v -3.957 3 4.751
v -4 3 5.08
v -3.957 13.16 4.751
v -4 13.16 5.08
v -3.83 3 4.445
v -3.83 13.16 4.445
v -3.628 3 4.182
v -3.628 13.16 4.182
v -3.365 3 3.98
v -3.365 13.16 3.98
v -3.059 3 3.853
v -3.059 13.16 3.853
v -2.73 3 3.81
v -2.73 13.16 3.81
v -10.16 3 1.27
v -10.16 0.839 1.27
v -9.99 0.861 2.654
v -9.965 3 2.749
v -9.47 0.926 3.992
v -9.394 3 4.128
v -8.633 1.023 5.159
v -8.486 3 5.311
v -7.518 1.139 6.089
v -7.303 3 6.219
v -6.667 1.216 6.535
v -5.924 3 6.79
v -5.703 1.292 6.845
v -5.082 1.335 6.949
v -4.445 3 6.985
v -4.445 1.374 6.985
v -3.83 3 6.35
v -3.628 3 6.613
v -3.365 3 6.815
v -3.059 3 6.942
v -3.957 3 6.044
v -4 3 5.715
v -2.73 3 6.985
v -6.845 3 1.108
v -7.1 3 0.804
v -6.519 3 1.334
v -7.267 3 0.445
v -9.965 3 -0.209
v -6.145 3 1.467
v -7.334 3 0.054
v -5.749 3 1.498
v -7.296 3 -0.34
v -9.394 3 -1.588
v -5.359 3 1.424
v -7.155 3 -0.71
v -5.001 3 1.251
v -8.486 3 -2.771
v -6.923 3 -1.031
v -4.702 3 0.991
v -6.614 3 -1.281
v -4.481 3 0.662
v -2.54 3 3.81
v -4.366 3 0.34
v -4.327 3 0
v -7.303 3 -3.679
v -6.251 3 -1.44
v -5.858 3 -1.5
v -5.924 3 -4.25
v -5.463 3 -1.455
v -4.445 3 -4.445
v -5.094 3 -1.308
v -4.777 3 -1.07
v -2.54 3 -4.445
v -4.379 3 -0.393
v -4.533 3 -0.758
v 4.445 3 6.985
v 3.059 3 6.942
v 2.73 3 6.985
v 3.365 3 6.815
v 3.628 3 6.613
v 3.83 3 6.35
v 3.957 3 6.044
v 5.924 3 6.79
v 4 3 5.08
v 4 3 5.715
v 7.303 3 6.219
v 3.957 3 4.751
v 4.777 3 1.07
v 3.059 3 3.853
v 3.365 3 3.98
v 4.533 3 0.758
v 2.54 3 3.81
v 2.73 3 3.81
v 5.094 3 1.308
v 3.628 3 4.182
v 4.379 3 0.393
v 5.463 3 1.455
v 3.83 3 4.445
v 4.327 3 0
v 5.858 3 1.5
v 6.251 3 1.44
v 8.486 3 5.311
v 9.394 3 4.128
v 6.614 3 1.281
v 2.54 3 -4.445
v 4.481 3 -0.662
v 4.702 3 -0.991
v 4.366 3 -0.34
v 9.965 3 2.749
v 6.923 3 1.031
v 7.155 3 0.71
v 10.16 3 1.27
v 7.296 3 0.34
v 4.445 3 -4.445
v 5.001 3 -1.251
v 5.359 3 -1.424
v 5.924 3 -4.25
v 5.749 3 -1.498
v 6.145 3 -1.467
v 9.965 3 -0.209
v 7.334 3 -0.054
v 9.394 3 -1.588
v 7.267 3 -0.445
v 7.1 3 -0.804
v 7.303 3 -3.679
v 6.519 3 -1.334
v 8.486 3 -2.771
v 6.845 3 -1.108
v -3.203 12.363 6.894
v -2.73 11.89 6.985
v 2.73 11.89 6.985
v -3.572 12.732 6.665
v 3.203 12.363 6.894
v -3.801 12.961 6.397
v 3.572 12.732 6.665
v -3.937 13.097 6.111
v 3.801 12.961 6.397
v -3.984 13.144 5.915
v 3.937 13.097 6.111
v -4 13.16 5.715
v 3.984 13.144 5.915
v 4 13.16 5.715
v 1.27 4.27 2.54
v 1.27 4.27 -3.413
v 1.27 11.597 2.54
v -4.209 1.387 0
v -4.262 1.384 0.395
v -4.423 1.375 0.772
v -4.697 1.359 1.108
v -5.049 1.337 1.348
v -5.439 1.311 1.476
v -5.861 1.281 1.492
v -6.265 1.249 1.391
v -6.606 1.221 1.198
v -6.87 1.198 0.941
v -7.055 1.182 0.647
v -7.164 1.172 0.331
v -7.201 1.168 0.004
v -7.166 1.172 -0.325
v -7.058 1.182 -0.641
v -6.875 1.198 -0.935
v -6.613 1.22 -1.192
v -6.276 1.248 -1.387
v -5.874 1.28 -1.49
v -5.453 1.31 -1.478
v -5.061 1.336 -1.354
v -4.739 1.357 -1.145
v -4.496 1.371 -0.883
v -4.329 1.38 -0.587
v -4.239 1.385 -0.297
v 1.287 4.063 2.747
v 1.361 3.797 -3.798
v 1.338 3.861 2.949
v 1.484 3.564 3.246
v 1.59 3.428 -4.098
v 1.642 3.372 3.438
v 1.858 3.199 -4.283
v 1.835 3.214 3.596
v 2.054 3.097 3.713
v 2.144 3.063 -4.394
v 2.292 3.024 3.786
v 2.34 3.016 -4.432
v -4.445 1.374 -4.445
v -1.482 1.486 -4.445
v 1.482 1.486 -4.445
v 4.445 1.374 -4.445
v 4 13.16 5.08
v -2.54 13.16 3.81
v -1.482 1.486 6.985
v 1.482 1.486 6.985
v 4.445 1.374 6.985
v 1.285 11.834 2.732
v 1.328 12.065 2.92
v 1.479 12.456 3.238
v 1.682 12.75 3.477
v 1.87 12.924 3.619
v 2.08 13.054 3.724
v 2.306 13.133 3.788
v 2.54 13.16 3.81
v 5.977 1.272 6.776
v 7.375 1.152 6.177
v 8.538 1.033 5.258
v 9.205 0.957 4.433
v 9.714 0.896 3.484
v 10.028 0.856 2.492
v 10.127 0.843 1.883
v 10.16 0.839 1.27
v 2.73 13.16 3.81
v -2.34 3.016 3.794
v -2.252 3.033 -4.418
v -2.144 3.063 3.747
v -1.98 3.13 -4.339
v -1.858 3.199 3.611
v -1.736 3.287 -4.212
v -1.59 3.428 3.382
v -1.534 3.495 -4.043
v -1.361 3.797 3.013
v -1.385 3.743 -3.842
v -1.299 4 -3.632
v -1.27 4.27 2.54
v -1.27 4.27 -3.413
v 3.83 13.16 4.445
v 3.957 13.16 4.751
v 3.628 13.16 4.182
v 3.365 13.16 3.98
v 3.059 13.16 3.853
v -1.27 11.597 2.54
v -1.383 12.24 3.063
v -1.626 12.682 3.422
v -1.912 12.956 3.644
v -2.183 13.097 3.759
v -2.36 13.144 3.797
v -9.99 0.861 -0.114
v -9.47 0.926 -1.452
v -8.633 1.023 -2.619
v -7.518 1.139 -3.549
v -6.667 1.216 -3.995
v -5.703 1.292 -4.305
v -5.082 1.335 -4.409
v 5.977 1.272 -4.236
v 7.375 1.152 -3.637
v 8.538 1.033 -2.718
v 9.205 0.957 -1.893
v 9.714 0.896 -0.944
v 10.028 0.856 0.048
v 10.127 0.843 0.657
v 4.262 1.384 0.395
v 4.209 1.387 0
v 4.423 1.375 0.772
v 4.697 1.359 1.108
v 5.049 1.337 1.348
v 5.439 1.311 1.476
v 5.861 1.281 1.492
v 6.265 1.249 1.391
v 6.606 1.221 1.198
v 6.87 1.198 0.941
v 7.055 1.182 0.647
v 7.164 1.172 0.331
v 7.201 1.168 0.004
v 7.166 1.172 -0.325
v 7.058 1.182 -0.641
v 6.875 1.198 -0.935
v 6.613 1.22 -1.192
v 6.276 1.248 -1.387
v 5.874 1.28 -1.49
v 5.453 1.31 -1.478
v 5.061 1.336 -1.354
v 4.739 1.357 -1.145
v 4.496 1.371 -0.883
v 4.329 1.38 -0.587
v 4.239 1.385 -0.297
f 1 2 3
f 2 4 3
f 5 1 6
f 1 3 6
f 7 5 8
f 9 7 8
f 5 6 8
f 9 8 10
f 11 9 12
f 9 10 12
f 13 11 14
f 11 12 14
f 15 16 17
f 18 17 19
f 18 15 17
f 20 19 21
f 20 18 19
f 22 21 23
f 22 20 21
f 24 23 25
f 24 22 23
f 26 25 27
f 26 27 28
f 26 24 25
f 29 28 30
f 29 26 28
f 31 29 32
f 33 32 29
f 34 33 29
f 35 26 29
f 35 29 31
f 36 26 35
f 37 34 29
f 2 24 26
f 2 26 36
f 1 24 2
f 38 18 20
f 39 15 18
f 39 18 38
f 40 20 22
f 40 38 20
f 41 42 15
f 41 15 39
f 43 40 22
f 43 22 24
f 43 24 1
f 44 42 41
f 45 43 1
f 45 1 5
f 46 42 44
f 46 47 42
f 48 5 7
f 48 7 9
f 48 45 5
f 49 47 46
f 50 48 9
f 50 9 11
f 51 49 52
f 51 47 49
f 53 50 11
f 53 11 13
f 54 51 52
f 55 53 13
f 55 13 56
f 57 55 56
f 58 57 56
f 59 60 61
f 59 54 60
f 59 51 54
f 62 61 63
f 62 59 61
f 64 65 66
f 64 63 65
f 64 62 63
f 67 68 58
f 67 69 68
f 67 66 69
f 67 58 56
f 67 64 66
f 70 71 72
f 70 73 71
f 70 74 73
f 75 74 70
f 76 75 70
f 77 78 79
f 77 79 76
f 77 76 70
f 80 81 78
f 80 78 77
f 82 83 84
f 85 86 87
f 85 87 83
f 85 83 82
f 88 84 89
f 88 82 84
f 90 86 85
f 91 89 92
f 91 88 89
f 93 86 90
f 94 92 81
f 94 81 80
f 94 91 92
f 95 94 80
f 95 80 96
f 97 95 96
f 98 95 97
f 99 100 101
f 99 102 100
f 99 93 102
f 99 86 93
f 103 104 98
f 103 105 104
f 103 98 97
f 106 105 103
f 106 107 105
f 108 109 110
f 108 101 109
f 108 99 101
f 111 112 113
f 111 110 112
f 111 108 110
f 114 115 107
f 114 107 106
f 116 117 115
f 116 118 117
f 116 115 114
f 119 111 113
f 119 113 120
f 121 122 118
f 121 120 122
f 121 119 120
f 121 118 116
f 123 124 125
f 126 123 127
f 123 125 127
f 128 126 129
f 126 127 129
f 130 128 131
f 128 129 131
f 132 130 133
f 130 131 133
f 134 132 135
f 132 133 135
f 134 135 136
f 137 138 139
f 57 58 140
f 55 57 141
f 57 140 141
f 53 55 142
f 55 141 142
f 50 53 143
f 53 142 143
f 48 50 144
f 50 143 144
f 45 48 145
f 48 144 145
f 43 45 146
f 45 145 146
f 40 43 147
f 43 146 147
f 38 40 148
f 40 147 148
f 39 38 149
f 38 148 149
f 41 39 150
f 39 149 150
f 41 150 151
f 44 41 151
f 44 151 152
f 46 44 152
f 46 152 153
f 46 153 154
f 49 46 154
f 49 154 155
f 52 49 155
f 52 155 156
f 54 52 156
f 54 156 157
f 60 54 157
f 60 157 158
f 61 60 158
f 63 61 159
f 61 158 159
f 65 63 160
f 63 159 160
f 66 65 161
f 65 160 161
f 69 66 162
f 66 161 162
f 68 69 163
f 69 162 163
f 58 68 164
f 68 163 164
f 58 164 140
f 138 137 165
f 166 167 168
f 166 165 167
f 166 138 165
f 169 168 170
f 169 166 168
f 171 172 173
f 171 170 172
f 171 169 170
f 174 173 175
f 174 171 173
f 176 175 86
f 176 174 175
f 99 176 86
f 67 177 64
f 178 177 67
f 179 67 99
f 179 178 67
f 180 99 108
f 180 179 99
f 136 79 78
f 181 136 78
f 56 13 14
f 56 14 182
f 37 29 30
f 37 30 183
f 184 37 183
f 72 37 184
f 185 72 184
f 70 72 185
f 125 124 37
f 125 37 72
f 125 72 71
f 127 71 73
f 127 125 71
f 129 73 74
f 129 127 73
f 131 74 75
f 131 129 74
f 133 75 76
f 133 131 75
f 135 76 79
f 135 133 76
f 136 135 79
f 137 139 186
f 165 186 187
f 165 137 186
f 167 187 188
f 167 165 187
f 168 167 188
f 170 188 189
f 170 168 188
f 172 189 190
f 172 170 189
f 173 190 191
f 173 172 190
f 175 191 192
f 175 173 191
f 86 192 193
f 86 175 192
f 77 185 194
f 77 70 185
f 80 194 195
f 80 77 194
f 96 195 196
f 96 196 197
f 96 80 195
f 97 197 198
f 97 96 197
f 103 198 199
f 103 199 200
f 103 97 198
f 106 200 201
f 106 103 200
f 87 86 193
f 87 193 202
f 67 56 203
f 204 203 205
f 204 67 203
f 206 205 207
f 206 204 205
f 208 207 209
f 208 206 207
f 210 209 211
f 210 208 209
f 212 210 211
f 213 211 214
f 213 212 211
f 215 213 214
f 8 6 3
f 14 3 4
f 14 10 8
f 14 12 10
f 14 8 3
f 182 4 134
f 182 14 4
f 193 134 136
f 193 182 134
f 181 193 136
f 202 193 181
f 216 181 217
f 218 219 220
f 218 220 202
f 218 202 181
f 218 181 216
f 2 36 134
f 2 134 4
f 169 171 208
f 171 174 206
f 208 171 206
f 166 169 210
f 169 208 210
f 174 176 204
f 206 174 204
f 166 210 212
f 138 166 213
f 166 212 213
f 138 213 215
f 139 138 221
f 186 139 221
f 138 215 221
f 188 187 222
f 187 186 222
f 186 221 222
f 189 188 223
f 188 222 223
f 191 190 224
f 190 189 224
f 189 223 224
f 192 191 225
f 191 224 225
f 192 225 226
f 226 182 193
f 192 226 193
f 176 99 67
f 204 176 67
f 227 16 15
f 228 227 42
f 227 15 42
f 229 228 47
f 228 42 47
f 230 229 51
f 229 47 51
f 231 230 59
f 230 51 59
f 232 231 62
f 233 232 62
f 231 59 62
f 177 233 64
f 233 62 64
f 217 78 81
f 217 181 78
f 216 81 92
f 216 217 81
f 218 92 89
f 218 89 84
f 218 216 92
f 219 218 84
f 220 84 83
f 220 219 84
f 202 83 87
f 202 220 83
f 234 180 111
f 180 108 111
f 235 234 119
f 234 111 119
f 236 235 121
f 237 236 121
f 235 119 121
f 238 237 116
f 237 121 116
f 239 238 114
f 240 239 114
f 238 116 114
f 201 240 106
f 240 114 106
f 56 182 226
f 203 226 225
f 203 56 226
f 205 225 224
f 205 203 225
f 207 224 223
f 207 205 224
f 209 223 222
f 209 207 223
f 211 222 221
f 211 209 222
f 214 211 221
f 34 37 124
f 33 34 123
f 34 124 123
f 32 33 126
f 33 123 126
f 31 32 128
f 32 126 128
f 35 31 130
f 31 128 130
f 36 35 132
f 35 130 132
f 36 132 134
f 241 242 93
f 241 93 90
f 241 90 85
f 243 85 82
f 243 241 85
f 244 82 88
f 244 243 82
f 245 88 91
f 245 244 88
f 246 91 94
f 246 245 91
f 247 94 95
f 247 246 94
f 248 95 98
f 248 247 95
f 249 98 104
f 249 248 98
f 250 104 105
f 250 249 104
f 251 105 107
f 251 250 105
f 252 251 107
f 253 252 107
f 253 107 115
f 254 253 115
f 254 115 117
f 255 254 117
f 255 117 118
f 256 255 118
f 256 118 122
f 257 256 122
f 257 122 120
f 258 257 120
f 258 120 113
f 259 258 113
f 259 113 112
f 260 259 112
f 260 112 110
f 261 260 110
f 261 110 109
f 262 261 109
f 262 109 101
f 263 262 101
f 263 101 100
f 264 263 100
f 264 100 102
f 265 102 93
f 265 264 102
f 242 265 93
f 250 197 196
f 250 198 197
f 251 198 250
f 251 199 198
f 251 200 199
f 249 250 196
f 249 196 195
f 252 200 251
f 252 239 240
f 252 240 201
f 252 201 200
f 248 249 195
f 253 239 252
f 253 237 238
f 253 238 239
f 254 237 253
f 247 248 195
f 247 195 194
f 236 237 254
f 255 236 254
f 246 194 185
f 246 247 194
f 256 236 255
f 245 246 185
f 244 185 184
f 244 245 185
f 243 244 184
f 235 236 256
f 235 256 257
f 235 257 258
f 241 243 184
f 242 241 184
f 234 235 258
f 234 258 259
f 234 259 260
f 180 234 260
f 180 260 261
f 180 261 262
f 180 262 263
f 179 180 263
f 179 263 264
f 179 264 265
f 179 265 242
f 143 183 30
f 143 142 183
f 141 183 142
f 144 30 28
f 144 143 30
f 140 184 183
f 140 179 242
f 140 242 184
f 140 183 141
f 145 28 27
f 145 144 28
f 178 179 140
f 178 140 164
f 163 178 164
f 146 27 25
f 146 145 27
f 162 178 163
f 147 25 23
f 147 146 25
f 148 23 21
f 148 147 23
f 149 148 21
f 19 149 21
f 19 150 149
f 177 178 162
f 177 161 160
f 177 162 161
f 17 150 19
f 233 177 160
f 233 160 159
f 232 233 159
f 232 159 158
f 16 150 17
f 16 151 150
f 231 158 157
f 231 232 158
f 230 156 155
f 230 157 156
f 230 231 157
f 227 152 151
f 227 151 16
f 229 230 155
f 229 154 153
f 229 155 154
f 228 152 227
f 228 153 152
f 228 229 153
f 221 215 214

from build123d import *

# Parameters (mm, degrees)
SKETCH1_W               = 20.32
SKETCH1_H               = 23.8125
BOSS_EXTRUDE1_DEPTH     = 3
SKETCH3_R               = 1.500000048
CUT_EXTRUDE1_DEPTH      = 84.279291716
CUT_EXTRUDE2_DEPTH      = 23.075453704
CUT_EXTRUDE2_DEPTH_BACK = 23.075453704
SKETCH2_R               = 78.359
SKETCH4_W               = 22.86
SKETCH4_H               = 20.306074834
CUT_EXTRUDE3_DEPTH      = 12.3825
SKETCH9_W               = 8
SKETCH9_H               = 3.175
BOSS_EXTRUDE2_DEPTH     = 10.16
BOSS_EXTRUDE3_DEPTH     = 1.27
FILLET7_R               = 5.715
FILLET8_R               = 1.27
FILLET9_R               = 1.27


# Some blends are built 0.0001 mm under size
with BuildPart() as part:
    # Sketch1 → Boss-Extrude1 (new body)
    with BuildSketch(Plane(origin=(0, 0, 0), x_dir=(1, 0, 0), z_dir=(0, 1, 0))):
        with Locations((0, -7.46125)):
            Rectangle(SKETCH1_W, SKETCH1_H)
        Polygon((3.9, -10.985), (6, -10.985), (6, -13.985), (2.999999969, -13.985), (2.999999969, -17.16), (-2.999999969, -17.16), (-2.999999969, -13.985), (-6, -13.985), (-6, -10.985), (-3.9, -10.985), (-3.9, -6.985), (3.9, -6.985), align=None, mode=Mode.SUBTRACT)
    extrude(amount=BOSS_EXTRUDE1_DEPTH)

    # Sketch3 → Cut-Extrude1 (cut, through all)
    with BuildSketch(Plane(origin=(-5.581860717, -76.451458097, 0), x_dir=(0, 0, 1), z_dir=(0.07281799962939917, 0.9973452456045363, 0))):
        with Locations(Location((0, 5.59671863, 0), (0, 0, 270))):
            Circle(SKETCH3_R)
    cut_extrude1 = extrude(amount=CUT_EXTRUDE1_DEPTH, mode=Mode.SUBTRACT)

    # Mirror1: Cut-Extrude1 across plane
    add(cut_extrude1.mirror(Plane(origin=(0, 0, 0), x_dir=(0, 0, 1), z_dir=(1, 0, 0))), mode=Mode.SUBTRACT)

    # Sketch2 → Cut-Extrude2 (cut, two sides: drawn at the far end of the back side and taken through both)
    with BuildSketch(Plane.XY.offset(-CUT_EXTRUDE2_DEPTH_BACK)):
        with Locations((0, -76.858999952)):
            Circle(SKETCH2_R)
    extrude(amount=CUT_EXTRUDE2_DEPTH + CUT_EXTRUDE2_DEPTH_BACK, mode=Mode.SUBTRACT)

    # Sketch4 → Cut-Extrude3 (cut)
    with BuildSketch(Plane.XY.offset(19.3675)):
        with Locations((-1.27, 10.991574627)):
            Rectangle(SKETCH4_W, SKETCH4_H)
    extrude(amount=-CUT_EXTRUDE3_DEPTH, mode=Mode.SUBTRACT)

    # Sketch9 → Boss-Extrude2 (add)
    with BuildSketch(Plane(origin=(0, 3, 0), x_dir=(1, 0, 0), z_dir=(0, 1, 0))):
        with Locations((0, -5.3975)):
            Rectangle(SKETCH9_W, SKETCH9_H)
    extrude(amount=BOSS_EXTRUDE2_DEPTH)

    # Sketch10 → Boss-Extrude3 (add, symmetric)
    with BuildSketch(Plane(origin=(0, 0, 0), x_dir=(0, 0, -1), z_dir=(1, 0, 0))):
        Polygon((-3.81, 13.16), (4.445, 3), (-3.81, 3), align=None)
    extrude(amount=BOSS_EXTRUDE3_DEPTH, both=True)

    # Fillet7
    fillet7_edges = [part.edges().sort_by_distance(p)[0] for p in [
        (-10.16, 1.919268605, 6.985),
        (-10.16, 1.919268605, -4.445),
        (10.16, 1.919268605, -4.445),
        (10.16, 1.919268605, 6.985),
    ]]
    fillet(fillet7_edges, radius=FILLET7_R - 0.0001)  # a hair under: the kernel refuses the full size

    # Fillet8
    fillet8_edges = [part.edges().sort_by_distance(p)[0] for p in [
        (4, 8.08, 6.985),
        (4, 8.08, 3.81),
        (-4, 8.08, 3.81),
        (-4, 8.08, 6.985),
        (0, 13.16, 6.985),
    ]]
    fillet(fillet8_edges, radius=FILLET8_R)

    # Fillet9
    # the kernel refuses this fillet: 1.27 mm, written as the material it adds along each edge
    with BuildSketch(Plane(origin=(-1.27, 3, 3.81), x_dir=(0, 0, -1), z_dir=(0, 1, 0))) as fillet9_piece_1_section:
        with BuildLine():
            CenterArc((FILLET9_R, FILLET9_R), FILLET9_R, 180, 90)
            Line((0, FILLET9_R), (0, 0))
            Line((0, 0), (FILLET9_R, 0))
        make_face()
    fillet9_piece_1 = extrude(amount=10.16, mode=Mode.PRIVATE)
    fillet9_piece_1 = split(fillet9_piece_1, bisect_by=Plane(origin=(-1.56303802, 9.860421862, 1.129092762), z_dir=(0, -0.630592625094466, 0.7761140001162654)), keep=Keep.TOP, mode=Mode.PRIVATE)
    add(fillet9_piece_1)
    with BuildSketch(Plane(origin=(-1.27, 3, -4.445), x_dir=(-1, 0, 0), z_dir=(0, 0, 1))) as fillet9_piece_2_section:
        with BuildLine():
            CenterArc((FILLET9_R, -FILLET9_R), FILLET9_R, 90, 90)
            Line((0, -FILLET9_R), (0, 0))
            Line((0, 0), (FILLET9_R, 0))
        make_face()
    fillet9_piece_2 = extrude(amount=11.43, mode=Mode.PRIVATE)
    fillet9_piece_2 = split(fillet9_piece_2, bisect_by=Plane(origin=(-1.561973496, 5.244551774, -2.621301684), z_dir=(0, -0.630592625094466, 0.7761140001162654)), keep=Keep.TOP, mode=Mode.PRIVATE)
    add(fillet9_piece_2)
    with BuildSketch(Plane(origin=(1.27, 3, 3.81), x_dir=(0, 0, -1), z_dir=(0, 1, 0))) as fillet9_piece_3_section:
        with BuildLine():
            CenterArc((FILLET9_R, -FILLET9_R), FILLET9_R, 90, 90)
            Line((0, -FILLET9_R), (0, 0))
            Line((0, 0), (FILLET9_R, 0))
        make_face()
    fillet9_piece_3 = extrude(amount=10.16, mode=Mode.PRIVATE)
    fillet9_piece_3 = split(fillet9_piece_3, bisect_by=Plane(origin=(1.56303802, 9.860421862, 1.129092762), z_dir=(0, -0.630592625094466, 0.7761140001162654)), keep=Keep.TOP, mode=Mode.PRIVATE)
    add(fillet9_piece_3)
    with BuildSketch(Plane(origin=(1.27, 3, -4.445), x_dir=(1, 0, 0), z_dir=(0, 0, 1))) as fillet9_piece_4_section:
        with BuildLine():
            CenterArc((FILLET9_R, FILLET9_R), FILLET9_R, 180, 90)
            Line((0, FILLET9_R), (0, 0))
            Line((0, 0), (FILLET9_R, 0))
        make_face()
    fillet9_piece_4 = extrude(amount=11.43, mode=Mode.PRIVATE)
    fillet9_piece_4 = split(fillet9_piece_4, bisect_by=Plane(origin=(1.561973496, 5.244551774, -2.621301684), z_dir=(0, -0.630592625094466, 0.7761140001162654)), keep=Keep.TOP, mode=Mode.PRIVATE)
    add(fillet9_piece_4)


solid = part.part
